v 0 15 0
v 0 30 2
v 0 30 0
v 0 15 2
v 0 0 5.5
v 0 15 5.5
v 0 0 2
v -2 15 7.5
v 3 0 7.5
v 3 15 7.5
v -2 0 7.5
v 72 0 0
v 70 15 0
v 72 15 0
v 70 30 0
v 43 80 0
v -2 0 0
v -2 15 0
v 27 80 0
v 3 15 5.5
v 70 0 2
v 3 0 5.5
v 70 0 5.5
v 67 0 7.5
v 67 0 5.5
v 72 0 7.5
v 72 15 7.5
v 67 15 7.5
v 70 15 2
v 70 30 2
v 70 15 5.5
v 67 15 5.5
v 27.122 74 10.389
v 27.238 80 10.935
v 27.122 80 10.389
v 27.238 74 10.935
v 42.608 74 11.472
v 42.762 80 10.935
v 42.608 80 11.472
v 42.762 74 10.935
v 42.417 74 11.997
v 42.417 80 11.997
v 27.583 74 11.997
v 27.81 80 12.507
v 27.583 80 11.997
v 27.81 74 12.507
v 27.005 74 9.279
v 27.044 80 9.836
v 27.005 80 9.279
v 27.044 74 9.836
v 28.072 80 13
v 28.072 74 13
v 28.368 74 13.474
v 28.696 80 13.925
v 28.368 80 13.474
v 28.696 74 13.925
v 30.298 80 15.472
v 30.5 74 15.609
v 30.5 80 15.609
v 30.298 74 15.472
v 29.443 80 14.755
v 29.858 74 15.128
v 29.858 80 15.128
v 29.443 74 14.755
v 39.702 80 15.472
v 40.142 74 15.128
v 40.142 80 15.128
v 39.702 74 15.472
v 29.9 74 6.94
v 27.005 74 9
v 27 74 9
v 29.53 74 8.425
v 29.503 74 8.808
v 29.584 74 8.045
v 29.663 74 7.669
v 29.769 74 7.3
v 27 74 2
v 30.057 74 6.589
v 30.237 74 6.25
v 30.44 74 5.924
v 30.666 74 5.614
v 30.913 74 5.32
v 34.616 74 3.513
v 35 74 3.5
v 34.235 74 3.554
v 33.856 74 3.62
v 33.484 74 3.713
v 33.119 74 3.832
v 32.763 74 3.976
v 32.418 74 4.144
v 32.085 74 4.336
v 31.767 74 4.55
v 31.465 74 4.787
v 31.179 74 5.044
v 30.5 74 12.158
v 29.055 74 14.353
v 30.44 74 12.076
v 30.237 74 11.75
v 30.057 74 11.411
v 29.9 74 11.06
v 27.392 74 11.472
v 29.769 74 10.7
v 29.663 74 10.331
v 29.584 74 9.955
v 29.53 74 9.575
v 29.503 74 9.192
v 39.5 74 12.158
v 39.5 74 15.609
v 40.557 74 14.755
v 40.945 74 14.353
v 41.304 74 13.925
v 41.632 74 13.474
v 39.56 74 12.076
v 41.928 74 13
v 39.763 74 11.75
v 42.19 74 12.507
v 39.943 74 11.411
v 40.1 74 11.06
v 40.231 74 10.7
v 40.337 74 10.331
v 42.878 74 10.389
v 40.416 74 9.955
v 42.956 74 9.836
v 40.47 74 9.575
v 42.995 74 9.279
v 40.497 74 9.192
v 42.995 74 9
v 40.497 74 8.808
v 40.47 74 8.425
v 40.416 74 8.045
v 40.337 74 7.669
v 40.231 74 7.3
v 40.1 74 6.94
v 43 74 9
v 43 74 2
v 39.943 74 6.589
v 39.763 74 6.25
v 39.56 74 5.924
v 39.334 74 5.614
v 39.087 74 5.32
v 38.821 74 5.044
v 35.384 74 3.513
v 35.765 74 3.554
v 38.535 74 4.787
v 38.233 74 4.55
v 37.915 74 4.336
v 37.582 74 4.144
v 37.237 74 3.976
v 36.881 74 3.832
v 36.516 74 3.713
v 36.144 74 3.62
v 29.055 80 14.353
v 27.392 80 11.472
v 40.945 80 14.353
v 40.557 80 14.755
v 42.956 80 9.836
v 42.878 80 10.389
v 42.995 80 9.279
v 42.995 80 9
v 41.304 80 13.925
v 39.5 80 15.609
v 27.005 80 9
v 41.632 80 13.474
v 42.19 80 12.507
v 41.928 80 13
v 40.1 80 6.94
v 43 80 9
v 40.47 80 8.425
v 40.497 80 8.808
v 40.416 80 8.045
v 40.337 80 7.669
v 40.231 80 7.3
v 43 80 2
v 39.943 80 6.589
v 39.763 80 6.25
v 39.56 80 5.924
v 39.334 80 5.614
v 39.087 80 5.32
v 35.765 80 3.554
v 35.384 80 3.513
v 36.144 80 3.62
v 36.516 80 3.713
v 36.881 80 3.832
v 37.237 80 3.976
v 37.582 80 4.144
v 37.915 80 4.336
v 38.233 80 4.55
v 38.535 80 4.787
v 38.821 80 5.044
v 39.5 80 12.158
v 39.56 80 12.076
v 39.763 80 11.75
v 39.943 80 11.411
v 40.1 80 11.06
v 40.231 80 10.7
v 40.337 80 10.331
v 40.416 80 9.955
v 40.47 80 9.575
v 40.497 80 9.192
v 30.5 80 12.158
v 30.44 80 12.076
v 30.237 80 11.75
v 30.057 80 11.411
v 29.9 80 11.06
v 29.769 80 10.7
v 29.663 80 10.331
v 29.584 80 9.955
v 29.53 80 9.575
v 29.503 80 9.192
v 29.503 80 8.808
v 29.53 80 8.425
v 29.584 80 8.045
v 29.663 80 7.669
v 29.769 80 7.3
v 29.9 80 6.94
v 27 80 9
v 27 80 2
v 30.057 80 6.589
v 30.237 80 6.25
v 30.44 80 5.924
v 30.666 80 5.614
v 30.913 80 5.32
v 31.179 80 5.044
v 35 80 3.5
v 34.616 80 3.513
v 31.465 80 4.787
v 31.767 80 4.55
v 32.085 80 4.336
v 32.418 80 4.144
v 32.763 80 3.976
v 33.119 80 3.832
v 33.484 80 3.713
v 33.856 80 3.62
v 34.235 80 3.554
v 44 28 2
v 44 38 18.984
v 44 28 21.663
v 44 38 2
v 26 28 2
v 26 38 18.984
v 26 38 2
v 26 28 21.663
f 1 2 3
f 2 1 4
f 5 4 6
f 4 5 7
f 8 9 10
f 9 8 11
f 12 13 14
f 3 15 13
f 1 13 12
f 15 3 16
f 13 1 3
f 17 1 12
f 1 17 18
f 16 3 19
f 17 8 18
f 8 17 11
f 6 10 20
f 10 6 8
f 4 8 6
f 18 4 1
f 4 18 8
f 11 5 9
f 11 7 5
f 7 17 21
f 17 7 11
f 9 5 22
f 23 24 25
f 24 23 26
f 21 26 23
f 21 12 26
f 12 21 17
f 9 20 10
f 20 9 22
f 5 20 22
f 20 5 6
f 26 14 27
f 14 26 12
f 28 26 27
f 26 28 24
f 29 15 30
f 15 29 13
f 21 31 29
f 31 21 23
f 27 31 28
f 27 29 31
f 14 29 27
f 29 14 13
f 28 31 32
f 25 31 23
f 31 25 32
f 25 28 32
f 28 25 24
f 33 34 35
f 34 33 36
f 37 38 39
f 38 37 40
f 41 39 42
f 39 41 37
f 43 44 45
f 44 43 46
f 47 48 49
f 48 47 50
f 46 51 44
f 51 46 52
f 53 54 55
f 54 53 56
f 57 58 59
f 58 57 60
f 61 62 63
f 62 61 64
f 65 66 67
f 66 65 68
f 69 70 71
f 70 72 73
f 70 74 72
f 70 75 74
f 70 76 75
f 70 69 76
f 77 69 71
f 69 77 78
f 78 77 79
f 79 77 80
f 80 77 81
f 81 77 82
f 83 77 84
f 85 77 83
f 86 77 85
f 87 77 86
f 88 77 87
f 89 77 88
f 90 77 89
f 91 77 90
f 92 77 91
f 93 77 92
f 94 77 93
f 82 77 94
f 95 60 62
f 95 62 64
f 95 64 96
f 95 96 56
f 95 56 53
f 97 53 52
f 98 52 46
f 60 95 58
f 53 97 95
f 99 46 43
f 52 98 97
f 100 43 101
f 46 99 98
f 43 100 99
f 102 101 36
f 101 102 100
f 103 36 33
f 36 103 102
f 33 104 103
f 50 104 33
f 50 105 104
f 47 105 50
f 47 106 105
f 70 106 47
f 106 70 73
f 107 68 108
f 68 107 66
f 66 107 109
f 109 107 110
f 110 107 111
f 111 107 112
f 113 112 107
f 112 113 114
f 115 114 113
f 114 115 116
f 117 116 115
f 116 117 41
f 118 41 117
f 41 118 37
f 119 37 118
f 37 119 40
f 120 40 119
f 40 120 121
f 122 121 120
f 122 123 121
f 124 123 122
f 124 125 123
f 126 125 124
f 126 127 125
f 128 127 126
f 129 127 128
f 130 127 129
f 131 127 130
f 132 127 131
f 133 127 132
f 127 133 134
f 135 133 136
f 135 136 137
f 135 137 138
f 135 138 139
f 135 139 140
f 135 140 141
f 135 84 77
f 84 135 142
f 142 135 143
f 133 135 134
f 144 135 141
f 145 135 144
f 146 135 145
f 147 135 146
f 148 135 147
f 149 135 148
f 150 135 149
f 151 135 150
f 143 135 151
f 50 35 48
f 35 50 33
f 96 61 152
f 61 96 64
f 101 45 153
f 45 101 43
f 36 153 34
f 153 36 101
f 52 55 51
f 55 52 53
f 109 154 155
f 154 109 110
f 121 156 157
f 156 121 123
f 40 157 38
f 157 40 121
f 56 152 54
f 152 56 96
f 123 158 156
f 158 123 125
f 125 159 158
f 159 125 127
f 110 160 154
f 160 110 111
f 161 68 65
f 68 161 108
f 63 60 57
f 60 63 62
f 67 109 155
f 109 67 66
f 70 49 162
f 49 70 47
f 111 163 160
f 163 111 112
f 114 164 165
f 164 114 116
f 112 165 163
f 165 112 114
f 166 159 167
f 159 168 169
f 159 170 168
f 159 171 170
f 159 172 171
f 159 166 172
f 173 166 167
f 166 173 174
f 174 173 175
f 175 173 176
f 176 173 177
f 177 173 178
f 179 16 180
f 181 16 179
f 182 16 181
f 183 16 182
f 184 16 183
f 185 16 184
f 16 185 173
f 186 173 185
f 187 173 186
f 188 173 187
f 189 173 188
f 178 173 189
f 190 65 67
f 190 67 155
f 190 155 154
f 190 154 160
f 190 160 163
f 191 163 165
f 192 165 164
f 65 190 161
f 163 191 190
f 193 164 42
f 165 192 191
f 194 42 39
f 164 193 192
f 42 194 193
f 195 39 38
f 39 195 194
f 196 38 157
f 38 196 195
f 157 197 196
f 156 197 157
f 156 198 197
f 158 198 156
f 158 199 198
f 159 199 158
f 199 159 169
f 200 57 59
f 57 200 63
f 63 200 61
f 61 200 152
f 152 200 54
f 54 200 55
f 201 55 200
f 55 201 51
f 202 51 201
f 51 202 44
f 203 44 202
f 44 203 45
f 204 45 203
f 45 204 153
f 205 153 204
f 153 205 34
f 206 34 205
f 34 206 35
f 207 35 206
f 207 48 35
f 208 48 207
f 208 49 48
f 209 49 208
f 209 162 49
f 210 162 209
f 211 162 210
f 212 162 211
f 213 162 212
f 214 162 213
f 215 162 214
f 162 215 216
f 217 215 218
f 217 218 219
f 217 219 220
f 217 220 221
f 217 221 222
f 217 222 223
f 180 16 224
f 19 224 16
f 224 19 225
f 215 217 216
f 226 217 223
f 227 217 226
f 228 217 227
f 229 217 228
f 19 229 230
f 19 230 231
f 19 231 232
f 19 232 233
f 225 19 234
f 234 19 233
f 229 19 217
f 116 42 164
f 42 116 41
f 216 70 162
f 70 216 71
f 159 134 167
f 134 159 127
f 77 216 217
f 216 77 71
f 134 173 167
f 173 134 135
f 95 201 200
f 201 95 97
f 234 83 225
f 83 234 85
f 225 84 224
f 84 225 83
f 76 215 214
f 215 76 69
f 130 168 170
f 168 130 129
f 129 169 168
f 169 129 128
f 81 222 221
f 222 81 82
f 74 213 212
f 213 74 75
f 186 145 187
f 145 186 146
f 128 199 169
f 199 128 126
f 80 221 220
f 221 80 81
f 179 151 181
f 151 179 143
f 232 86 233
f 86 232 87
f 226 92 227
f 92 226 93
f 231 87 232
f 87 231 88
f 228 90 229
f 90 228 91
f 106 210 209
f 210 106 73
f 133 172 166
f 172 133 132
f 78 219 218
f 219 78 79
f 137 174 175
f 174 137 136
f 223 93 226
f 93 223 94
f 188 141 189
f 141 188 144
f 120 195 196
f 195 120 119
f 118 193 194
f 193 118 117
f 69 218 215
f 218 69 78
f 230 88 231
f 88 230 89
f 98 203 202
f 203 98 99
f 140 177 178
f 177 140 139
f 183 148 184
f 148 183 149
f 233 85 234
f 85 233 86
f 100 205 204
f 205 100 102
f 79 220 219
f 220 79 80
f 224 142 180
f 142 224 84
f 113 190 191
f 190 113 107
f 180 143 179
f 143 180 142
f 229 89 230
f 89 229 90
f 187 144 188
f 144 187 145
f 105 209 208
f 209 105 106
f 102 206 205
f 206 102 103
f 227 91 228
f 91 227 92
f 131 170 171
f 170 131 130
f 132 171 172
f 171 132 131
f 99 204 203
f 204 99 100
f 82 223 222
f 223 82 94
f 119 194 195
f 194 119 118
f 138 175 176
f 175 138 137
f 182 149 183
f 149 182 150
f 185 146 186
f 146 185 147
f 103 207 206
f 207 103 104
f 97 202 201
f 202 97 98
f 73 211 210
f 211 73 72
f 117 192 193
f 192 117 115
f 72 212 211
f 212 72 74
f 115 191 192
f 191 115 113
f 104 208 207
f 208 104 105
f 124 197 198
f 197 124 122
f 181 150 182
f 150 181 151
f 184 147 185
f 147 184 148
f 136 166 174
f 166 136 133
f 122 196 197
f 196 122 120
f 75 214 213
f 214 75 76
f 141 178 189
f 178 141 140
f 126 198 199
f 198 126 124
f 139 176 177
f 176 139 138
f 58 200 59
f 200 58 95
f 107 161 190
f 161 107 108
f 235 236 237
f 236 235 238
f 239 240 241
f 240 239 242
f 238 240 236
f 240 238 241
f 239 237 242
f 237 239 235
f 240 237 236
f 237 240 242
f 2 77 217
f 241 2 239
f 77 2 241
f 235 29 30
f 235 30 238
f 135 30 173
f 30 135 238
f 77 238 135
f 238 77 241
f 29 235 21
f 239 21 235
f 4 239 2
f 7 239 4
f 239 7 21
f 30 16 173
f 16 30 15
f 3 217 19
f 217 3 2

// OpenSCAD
$fn = 90;
width = 70;
thickness = 3.5;

cube([width, 30, 2]);

module support() {
    difference() {
        cylinder(d = 11, h = 20);
        translate([0, 0, -1]) cylinder(d = 6.6, h = 22);
    }
}

linear_extrude(height = 2) {
    polygon(points = [[0, 30], [width/2-8, 80], [width/2+8, 80], [width, 30]]);
}

clipR();
clipL();
screwClip();
column();

module column() {
    translate([width/2, 33, 0]) {
        translate([0, 0, 11.5]) { 
            difference() {
                cube([18, 10, 22], true);
                translate([0, 0, 14]) rotate([-15, 0, 0]) cube([20, 20, 10], true);
            }
        }
        //cylinder(d = 10, h= 21);
    }
}

module clipR() {
    translate([-2, 0, 0]) cube([2, 15, thickness*2+ 0.5]);
    translate([-2, 0, thickness*2-1.5]) cube([5, 15, 2]);
}

module clipL() {
    translate([width, 0, 0]) cube([2, 15, thickness*2+ 0.5]);
    translate([width-3, 0, thickness*2-1.5]) cube([5, 15, 2]);
}

module screwClip() {
    translate([width / 2, 74, 9]) rotate([0, 90, 90]) {
        difference() {
            translate([0, 0, 0]) {
                translate([0, 0, 0]) cylinder(d = 16, h = 6);
                translate([0, -8, 0]) cube([8, 16, 6]);
            }
            translate([0, 0, -1]) cylinder(d = 11, h = 8);
            translate([-10, -4.5, -1]) cube([10, 9, 10]);
        }
    }
}
